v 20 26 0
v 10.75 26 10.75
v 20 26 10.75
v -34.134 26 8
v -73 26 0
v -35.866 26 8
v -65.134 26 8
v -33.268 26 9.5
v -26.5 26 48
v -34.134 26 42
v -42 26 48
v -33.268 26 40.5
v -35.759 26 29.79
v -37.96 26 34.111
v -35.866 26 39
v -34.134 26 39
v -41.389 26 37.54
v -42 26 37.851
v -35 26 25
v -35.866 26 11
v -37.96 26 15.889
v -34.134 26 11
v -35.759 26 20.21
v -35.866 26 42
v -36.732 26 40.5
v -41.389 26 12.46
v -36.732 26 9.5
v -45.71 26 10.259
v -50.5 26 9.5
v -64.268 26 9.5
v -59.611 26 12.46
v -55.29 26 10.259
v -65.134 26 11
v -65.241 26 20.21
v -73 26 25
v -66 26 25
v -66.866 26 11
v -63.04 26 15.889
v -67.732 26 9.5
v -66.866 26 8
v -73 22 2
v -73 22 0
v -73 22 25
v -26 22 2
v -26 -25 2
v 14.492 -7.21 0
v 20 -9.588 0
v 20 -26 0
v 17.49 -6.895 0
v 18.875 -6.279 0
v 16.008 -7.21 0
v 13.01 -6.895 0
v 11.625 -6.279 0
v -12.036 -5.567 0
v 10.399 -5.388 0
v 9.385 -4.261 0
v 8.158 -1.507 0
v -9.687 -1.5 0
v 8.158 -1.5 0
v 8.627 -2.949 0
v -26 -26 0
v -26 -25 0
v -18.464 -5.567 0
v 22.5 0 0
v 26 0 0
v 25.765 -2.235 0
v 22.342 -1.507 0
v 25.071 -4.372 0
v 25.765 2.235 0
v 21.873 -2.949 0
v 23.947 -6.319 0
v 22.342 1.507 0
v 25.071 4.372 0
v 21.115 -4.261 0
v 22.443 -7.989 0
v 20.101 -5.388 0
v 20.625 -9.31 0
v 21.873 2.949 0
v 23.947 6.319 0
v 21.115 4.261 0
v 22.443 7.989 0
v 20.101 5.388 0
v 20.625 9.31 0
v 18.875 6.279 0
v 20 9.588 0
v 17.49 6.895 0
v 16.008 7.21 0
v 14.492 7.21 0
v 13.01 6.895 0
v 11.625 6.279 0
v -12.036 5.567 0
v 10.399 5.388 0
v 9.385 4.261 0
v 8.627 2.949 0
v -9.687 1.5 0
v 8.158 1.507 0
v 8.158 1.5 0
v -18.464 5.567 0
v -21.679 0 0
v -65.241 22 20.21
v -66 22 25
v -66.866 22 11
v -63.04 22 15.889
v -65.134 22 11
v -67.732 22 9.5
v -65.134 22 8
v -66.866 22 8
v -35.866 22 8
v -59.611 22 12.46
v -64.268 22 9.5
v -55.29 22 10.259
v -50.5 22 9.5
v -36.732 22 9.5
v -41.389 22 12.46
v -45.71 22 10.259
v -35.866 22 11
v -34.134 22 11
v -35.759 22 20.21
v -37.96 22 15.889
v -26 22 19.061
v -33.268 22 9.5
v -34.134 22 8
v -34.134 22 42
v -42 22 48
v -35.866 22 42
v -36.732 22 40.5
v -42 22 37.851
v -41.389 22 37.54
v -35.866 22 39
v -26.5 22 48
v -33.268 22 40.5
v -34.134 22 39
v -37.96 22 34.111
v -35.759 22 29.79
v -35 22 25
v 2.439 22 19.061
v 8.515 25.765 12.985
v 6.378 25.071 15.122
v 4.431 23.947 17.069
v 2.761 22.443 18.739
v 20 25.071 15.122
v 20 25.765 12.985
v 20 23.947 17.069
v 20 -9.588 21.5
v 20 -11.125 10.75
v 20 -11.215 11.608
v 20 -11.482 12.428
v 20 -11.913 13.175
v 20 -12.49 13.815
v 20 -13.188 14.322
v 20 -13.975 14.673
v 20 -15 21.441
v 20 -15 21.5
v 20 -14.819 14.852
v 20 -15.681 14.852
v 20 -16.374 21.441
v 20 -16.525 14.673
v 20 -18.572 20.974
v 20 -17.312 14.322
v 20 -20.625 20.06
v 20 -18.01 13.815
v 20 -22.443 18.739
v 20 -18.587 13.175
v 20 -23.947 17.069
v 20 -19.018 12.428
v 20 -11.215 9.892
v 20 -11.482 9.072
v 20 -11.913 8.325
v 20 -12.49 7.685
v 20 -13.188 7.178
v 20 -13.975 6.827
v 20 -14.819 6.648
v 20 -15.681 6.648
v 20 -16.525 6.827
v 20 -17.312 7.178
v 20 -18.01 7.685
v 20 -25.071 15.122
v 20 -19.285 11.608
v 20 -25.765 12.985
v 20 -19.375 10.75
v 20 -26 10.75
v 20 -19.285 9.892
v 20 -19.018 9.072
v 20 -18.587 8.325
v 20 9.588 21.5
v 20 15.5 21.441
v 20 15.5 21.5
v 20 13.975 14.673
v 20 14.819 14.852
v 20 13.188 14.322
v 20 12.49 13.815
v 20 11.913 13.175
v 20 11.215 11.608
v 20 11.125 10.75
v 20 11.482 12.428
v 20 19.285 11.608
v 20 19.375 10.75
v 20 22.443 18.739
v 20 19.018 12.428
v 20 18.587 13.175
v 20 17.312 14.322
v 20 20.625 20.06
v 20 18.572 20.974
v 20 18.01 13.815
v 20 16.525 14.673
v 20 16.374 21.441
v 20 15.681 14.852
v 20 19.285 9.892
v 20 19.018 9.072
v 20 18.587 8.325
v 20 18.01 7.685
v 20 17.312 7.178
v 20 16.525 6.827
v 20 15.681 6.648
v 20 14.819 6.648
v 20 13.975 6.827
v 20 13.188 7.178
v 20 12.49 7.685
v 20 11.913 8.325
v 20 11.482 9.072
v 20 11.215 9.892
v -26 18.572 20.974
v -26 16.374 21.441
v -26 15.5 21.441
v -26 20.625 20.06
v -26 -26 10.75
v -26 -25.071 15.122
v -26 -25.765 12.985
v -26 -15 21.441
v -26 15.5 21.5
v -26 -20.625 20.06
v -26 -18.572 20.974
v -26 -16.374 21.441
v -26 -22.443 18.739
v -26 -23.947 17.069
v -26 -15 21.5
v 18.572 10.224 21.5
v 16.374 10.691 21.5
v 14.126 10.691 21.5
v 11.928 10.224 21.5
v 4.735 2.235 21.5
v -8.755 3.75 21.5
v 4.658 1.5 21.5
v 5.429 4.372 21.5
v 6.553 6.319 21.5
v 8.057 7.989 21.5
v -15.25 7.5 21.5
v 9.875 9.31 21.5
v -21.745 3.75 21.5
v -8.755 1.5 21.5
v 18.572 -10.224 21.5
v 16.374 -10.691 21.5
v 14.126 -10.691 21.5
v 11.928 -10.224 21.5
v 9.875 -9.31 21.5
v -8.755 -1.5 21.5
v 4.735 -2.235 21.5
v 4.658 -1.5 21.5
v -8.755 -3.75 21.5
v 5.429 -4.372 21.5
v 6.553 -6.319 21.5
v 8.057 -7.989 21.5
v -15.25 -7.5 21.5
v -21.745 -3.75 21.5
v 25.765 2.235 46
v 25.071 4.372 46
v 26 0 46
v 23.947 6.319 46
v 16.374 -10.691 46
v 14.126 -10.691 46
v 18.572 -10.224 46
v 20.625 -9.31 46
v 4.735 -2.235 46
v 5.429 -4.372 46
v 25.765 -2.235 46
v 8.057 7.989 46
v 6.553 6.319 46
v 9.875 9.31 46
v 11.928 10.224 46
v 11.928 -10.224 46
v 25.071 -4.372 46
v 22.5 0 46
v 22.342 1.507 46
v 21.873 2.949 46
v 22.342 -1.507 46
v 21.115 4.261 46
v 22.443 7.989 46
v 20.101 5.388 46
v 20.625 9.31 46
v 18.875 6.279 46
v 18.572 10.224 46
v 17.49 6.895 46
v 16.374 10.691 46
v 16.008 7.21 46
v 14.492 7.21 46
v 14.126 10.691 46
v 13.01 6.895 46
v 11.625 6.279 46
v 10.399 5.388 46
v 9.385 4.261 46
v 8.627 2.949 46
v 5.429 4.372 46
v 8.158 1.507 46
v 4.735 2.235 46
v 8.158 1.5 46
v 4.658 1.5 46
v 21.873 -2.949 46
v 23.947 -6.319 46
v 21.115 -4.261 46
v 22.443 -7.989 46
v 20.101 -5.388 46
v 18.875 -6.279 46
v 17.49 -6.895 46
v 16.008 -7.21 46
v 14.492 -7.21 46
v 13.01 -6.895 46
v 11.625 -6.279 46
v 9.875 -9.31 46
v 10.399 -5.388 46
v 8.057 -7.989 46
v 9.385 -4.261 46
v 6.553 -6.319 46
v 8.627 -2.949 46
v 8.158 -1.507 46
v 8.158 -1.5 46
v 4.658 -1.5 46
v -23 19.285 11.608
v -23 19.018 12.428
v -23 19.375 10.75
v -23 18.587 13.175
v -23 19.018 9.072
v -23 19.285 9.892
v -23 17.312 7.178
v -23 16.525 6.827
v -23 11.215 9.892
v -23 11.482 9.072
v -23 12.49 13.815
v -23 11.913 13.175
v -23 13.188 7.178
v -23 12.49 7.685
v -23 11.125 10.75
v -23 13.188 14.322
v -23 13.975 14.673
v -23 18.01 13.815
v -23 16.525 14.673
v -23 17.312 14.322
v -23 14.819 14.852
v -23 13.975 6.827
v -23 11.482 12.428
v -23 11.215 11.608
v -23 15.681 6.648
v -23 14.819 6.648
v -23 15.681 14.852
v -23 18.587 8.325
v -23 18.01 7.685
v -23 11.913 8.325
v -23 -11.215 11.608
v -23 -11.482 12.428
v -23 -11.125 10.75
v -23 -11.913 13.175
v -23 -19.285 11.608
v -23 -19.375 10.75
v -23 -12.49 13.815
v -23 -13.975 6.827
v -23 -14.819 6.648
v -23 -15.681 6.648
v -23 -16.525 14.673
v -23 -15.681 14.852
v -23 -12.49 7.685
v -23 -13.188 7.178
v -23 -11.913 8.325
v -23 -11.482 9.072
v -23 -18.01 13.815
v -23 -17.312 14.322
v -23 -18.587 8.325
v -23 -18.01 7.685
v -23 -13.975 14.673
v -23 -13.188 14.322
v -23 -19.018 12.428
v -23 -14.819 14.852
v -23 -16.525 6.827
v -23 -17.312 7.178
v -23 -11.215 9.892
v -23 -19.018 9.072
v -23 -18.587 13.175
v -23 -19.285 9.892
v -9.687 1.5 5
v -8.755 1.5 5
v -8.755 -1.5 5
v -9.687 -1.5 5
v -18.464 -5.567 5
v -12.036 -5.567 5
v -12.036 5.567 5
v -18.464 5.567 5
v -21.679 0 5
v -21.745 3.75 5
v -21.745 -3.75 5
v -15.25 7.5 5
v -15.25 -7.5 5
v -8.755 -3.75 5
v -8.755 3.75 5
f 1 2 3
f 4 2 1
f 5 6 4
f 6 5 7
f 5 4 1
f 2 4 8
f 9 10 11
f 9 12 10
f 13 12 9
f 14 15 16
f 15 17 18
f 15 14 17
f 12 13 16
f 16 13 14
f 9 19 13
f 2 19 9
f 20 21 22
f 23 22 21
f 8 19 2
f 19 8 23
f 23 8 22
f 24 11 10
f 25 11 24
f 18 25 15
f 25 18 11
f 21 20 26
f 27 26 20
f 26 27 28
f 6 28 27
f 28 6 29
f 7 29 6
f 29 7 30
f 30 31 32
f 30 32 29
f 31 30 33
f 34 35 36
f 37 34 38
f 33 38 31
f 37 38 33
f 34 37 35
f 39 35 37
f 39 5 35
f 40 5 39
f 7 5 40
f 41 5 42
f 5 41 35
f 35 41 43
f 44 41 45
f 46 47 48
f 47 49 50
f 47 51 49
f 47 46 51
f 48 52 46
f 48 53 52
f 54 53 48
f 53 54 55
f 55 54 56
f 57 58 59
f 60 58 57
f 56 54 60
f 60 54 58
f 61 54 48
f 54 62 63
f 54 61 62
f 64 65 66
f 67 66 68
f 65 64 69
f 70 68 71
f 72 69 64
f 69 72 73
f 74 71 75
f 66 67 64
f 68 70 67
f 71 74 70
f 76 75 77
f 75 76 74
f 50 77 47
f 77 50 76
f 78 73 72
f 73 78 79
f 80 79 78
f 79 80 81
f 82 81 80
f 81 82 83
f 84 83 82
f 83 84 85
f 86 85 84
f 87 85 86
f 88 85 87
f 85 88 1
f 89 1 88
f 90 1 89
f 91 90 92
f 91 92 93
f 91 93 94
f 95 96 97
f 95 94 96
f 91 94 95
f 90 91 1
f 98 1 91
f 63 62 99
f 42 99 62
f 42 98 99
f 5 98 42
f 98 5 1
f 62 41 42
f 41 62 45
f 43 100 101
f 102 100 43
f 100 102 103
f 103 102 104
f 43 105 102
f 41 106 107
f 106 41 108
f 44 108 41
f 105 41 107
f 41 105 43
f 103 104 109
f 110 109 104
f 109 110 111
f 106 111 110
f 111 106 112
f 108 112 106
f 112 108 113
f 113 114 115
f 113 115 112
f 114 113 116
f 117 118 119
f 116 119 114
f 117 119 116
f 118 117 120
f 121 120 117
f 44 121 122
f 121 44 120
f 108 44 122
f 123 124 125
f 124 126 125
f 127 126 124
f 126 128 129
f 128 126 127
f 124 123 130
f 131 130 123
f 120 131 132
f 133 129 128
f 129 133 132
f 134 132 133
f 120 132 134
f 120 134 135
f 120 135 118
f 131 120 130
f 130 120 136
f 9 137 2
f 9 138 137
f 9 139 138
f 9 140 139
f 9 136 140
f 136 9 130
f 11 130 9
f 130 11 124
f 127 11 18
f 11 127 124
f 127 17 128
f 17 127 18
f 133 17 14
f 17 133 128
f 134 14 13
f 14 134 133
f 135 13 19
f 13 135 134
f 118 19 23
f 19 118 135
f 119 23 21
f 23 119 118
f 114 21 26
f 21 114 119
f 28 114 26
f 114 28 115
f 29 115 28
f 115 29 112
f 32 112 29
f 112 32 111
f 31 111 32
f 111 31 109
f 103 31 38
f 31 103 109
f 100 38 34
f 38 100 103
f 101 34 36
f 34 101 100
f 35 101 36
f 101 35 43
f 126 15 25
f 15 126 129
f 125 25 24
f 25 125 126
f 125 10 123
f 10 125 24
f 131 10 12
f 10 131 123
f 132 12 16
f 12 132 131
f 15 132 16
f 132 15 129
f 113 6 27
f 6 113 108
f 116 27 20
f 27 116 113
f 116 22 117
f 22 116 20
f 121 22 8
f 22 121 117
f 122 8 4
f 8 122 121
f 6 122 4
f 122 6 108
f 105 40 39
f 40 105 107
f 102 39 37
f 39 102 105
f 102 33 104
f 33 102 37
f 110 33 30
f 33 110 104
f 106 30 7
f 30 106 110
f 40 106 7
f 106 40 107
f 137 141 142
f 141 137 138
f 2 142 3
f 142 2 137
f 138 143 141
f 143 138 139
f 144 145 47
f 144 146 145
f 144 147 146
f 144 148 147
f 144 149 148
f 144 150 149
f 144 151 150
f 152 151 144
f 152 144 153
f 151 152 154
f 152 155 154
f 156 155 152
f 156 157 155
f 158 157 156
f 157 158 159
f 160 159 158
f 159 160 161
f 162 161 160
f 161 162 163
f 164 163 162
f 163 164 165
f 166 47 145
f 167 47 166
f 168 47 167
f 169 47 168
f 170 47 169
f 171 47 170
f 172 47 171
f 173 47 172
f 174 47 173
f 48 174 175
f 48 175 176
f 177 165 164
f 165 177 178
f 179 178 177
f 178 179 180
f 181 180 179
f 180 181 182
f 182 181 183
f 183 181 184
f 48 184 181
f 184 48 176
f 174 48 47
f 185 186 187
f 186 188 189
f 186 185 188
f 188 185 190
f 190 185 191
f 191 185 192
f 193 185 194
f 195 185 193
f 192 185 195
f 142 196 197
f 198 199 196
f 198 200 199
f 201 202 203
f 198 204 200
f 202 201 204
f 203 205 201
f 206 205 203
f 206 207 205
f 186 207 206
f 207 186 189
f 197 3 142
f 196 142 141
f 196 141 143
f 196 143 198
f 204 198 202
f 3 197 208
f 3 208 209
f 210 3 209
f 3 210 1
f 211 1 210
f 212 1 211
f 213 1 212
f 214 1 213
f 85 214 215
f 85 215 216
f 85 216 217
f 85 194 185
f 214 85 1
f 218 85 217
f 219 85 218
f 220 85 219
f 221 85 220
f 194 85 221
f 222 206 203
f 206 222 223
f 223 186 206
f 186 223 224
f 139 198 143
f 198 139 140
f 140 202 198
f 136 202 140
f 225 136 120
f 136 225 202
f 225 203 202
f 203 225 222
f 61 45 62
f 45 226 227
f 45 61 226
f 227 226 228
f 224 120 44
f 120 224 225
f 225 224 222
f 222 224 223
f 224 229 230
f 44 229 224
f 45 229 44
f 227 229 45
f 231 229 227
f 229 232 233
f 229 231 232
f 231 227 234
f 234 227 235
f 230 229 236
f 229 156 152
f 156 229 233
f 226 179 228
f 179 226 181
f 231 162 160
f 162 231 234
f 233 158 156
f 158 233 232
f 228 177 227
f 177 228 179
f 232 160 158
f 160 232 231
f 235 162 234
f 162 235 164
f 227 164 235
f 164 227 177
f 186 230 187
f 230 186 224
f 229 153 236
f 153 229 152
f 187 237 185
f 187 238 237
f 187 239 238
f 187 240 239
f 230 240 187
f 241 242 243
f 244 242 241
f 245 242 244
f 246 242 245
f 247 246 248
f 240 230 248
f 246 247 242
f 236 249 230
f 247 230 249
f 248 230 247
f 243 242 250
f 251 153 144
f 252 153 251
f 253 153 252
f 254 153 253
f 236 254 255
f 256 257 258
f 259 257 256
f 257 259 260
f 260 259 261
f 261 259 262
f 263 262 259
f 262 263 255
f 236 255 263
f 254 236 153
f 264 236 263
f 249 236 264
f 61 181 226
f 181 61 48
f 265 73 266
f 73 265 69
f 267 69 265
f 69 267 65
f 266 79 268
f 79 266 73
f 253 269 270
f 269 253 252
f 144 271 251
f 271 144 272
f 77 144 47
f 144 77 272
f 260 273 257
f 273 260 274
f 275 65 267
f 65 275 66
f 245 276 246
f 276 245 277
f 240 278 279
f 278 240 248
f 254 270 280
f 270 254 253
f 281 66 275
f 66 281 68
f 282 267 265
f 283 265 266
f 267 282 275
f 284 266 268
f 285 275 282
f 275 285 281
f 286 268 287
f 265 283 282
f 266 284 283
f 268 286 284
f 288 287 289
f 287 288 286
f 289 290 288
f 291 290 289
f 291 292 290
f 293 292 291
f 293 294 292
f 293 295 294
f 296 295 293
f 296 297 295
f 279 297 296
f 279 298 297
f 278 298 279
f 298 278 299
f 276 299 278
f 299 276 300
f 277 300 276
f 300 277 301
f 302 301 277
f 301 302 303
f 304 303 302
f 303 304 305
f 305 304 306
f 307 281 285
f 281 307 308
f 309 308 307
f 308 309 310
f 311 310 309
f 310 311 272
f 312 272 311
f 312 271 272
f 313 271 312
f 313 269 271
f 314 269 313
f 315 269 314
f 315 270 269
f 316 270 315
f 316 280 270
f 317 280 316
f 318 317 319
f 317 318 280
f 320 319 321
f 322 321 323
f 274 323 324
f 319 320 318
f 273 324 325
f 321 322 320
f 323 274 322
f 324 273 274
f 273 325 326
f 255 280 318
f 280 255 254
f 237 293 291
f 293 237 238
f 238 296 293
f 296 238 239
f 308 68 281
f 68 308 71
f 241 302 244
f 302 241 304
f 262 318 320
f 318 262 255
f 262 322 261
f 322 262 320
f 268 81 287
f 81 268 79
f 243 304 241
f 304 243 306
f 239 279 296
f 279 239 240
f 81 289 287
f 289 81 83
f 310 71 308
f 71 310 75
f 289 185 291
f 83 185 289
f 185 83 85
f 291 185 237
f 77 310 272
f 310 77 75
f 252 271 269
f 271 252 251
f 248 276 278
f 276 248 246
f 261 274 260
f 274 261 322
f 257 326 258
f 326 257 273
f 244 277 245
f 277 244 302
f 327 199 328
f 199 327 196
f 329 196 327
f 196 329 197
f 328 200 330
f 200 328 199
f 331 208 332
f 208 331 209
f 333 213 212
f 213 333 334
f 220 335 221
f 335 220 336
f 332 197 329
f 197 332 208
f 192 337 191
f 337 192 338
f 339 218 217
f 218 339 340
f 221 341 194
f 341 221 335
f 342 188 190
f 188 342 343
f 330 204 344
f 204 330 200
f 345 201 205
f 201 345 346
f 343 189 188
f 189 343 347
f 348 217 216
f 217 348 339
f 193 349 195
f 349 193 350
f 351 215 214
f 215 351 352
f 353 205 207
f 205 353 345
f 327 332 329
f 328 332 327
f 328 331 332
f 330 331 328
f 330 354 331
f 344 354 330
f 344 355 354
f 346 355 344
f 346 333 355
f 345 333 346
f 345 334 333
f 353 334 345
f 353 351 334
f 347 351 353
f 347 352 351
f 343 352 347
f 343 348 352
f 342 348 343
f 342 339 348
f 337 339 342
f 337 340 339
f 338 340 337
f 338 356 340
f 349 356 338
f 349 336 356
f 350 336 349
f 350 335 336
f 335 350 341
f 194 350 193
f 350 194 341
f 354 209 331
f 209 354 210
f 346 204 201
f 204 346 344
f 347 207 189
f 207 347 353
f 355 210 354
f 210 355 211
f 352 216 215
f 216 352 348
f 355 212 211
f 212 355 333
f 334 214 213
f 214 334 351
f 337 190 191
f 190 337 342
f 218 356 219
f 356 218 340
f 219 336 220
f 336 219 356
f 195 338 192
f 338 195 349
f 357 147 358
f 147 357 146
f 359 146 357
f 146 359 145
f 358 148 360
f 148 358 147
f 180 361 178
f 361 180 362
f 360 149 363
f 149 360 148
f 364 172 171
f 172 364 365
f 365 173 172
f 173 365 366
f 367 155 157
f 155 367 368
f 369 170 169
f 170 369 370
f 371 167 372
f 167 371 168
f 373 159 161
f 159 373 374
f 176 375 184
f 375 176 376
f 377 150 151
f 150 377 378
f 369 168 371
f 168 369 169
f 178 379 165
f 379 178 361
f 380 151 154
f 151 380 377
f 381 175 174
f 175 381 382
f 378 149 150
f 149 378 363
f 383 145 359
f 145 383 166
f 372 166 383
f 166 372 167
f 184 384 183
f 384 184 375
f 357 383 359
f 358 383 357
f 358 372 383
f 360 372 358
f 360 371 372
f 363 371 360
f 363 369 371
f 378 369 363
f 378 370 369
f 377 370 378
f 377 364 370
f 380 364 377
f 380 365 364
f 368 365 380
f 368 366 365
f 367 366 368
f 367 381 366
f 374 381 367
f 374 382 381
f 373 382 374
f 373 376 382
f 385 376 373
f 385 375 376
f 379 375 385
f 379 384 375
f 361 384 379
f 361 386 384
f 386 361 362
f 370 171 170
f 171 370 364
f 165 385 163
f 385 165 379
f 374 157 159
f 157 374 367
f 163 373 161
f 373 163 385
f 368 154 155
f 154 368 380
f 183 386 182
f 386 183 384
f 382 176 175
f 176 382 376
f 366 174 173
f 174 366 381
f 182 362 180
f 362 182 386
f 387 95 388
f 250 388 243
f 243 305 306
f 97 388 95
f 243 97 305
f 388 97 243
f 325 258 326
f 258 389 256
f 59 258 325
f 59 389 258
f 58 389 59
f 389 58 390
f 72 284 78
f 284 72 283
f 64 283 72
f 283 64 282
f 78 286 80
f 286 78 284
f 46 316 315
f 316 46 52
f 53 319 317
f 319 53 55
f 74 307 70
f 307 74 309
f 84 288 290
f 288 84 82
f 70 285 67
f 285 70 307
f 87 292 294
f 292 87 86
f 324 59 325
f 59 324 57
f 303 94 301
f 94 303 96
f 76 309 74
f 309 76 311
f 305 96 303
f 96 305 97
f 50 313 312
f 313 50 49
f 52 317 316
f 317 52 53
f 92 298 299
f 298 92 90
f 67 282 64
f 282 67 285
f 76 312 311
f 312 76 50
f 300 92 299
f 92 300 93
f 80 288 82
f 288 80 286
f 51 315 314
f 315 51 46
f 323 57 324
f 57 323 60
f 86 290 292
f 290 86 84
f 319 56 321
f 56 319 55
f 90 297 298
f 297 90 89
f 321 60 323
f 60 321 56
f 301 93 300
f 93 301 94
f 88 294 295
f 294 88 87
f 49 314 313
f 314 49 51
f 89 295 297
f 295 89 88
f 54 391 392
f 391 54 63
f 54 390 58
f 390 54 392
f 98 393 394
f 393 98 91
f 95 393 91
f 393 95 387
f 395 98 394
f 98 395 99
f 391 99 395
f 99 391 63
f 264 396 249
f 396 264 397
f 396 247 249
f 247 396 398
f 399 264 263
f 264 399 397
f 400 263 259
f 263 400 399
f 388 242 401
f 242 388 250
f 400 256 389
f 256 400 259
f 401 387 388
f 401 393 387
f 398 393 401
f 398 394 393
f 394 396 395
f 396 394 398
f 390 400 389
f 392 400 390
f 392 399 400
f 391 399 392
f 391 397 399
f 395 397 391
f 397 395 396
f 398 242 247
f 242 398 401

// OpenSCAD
include <wallace2.scad>;

//x_end2(0);
//translate([-60,0,0]) 
x_end2(1);


module x_end2(motor = 0) mirror([(motor == 0) ? 1 : 0, 0, 0]) difference() {
	union() {
	
		if(motor > 0){
    
      translate([-1-(motor_casing / 2 + rod_size + bearing_size + 8) / 2 - motor_casing, (x_rod_spacing + 8 + rod_size)/2 + 3, 2])
      {

       rotate([90, 0, 0]) 
        {


          // Motor plate
          translate([0,-2,0]) 
          {
            difference(){
              cube([motor_casing+3,2,(motor_casing / 2 + rod_size + bearing_size + 18)-7]);
              // cut off plate 45 degrees
			  translate([0,-1,4]) rotate([0,-45,0]) cube([motor_casing*2,2+2,40]);
            }
          }
          // Motor holder
          linear_extrude(height = 4) difference() {
            square([motor_casing + 40, x_rod_spacing + 8 + rod_size]);
            translate([motor_casing / 2, (x_rod_spacing + 8 + rod_size) / 2, 0]) {
              circle(motor_screw_spacing / 2);
              for(x = [1, -1]) for(y = [1, -1]) translate([x * motor_screw_spacing / 2, y * motor_screw_spacing / 2, 0]) circle(m3_size * da6, $fn = 6);
              #translate([-(motor_casing * 1.5 - motor_screw_spacing), (motor > 1) ? (motor_casing / 2 - motor_screw_spacing) : 0, 0]) square([motor_casing*1, x_rod_spacing + 8 + rod_size]);
              translate([motor_casing+2,0,0])rotate([0,0,-45])  #translate([-(motor_casing * 1.5 - motor_screw_spacing), (motor > 1) ? (motor_casing / 2 - motor_screw_spacing) : 0, 0]) square([motor_casing*1.5, x_rod_spacing + 8 + rod_size]);
            }
          }
          
          // Belt
          %translate([motor_casing / 2, (x_rod_spacing + 8 + rod_size) / 2, rod_size / 2 - 2 - bearing_size / 2 - 2 - idler_pulley_width / 2]) rotate([180, 0, 0]) linear_extrude(height = 5, convexity = 5) difference() {
            union() {
              circle(pulley_size / 2 + 2);
              translate([0, -pulley_size / 2 - 2, 0]) square([200.5, pulley_size + 4]);
              translate([200.5, 0, 0]) circle(pulley_size / 2 + 2);
            }
            circle(pulley_size / 2);
            translate([0, -pulley_size / 2, 0]) square([200.5, pulley_size]);
            translate([200.5, 0, 0]) circle(pulley_size / 2);
          }

        }
      }
}
		
    difference() {
			union() {
        // cylinders for bearings & Z-rod
				for(side = [1]) translate([side * (motor_casing / 4 + rod_size / 2), 0, 0]) cylinder(r=bearing_size / 2 + 3, $fn = 30,h=x_rod_spacing + 8 + rod_size);
        // connector between these cylinders
				//translate([-x_rod_spacing/2,-1*(bearing_size / 2 + 3), 0]) cube([motor_casing / 2 + rod_size,2*(bearing_size / 2 + 3),x_rod_spacing + 8 + rod_size]);
				
        // cylinders for x-rods
		rotate([90,0,90]){

		for(side = [1, -1]) 
          translate([side * (motor_casing / 4 + rod_size / 2), bearing_size / 2 + 3,-1/2*(x_rod_spacing + 8 + rod_size)-3]) 
          cylinder(r=bearing_size / 2 + 3, $fn = 30,h=x_rod_spacing + 8 + rod_size);

        // connector block between cylinders
				translate([-x_rod_spacing/2,0, -1/2*(x_rod_spacing + 8 + rod_size)-3]) cube([motor_casing / 2 + rod_size,2*(bearing_size / 2 + 3),x_rod_spacing + 8 + rod_size]);

        // bottom half cube to make bottom straight
				translate([-x_rod_spacing/2-(bearing_size / 2 + 3)-.25,0, -1/2*(x_rod_spacing + 8 + rod_size)-3]) 
          cube([motor_casing / 2 + rod_size + 2*(bearing_size / 2 + 3),0.5*2*(bearing_size / 2 + 3),x_rod_spacing + 8 + rod_size]);

  
      if(motor == 0)   {
      // idler bolt bearing guide
        rotate([0,90,0]){
          hull(){
            translate([0,0.5*(x_rod_spacing + 8 + rod_size), 0]) {
              cylinder(r=8,h=0.5*(x_rod_spacing + 8 + rod_size)+3,$fn=50); 
              translate([0,-8,0]) cylinder(r=15,h=0.5*(x_rod_spacing + 8 + rod_size)+3,$fn=20); 
            }
          }
		  
		              translate([0,0.5*(x_rod_spacing + 8 + rod_size), 0.5*(x_rod_spacing + 8 + rod_size)]) {
			hull(){
					  cylinder(r=15,h=3,$fn=50); 
              translate([0,-8,0]) cylinder(r=15,h=3,$fn=50); 
			  }
}
		  
		  
        }
      }

        }

   

		}

			
			// clamp spacer 
      cube([motor_casing / 2 + rod_size, 3,2+2*(x_rod_spacing + 8 + rod_size)], center = true);

			// bearing hole
      translate([(motor_casing / 4 + rod_size / 2), 0, -1]) cylinder(h=2+x_rod_spacing + 8 + rod_size,r=bearing_size / 2 - .5, $fn = 30);

      // nut hole
			translate([-(motor_casing / 4 + rod_size / 2), 0, -1]) cylinder(h=2+x_rod_spacing + 8 + rod_size,r=rod_nut_size * 6/14, $fn = 6);

      if(motor == 0)   {

        // idler bolt mount - hole
        rotate([90,0,0]){
          translate([0,0.5*(x_rod_spacing + 8 + rod_size), -50]) 
            #cylinder(r=7.6/2,h=50); 
        }
       }

	   // smooth rod holes
			rotate([90,0,90]){
         for(side = [1, -1]) 
         translate([side * (motor_casing / 4 + rod_size / 2), bearing_size / 2 + 3,-1/2*(x_rod_spacing + 8 + rod_size)]) 
         #cylinder(r=rod_size/2 + 0.125, $fn = 30,h=x_rod_spacing + 8 + rod_size+10);
      }
			
		}


		
	}

  // z-screw hole
  if(motor == 0) translate([rod_size/2+2,-1*0.5*(x_rod_spacing + 8 + rod_size),-1]) cylinder(r=3/2-0.15,h=50);
  //if(motor == 0) translate([-rod_size/2-2,-1*0.5*(x_rod_spacing + 8 + rod_size),-1]) cylinder(r=3/2-0.15,h=50);


  // M8 nut cap
	translate([-(motor_casing / 4 + rod_size / 2), 0, 5]) rotate(90) #cylinder(r = rod_nut_size / 2, h = x_rod_spacing + 8 + rod_size, $fn = 6);

  // smooth rod display
	translate([(motor_casing / 4 + rod_size / 2), 0, 5]) %rotate(180 / 8) #cylinder(r = rod_size * da8, h = 200, center = true, $fn = 8);
}
